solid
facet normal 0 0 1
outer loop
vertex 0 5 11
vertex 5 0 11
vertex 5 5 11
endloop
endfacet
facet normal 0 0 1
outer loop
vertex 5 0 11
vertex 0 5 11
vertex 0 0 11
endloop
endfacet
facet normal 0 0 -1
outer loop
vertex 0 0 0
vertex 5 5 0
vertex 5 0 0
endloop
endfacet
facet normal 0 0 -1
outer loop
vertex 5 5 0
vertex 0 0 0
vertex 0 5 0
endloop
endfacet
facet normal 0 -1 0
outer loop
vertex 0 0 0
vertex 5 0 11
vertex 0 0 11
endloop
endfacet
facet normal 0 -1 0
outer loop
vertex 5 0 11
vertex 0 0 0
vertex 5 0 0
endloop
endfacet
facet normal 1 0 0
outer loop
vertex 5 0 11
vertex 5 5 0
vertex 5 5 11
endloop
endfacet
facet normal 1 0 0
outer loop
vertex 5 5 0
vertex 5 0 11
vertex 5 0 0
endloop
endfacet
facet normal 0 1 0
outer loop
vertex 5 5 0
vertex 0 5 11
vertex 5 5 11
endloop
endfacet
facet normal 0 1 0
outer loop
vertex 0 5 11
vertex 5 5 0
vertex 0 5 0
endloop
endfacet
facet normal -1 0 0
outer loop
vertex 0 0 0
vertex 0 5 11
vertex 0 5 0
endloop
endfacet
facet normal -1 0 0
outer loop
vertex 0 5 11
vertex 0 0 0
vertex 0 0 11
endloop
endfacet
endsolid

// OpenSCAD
// Construct: function definition + call feeding a dimension.
function box_height(base) = base * 2 + 1;
b = 5;
cube([b, b, box_height(b)]);
